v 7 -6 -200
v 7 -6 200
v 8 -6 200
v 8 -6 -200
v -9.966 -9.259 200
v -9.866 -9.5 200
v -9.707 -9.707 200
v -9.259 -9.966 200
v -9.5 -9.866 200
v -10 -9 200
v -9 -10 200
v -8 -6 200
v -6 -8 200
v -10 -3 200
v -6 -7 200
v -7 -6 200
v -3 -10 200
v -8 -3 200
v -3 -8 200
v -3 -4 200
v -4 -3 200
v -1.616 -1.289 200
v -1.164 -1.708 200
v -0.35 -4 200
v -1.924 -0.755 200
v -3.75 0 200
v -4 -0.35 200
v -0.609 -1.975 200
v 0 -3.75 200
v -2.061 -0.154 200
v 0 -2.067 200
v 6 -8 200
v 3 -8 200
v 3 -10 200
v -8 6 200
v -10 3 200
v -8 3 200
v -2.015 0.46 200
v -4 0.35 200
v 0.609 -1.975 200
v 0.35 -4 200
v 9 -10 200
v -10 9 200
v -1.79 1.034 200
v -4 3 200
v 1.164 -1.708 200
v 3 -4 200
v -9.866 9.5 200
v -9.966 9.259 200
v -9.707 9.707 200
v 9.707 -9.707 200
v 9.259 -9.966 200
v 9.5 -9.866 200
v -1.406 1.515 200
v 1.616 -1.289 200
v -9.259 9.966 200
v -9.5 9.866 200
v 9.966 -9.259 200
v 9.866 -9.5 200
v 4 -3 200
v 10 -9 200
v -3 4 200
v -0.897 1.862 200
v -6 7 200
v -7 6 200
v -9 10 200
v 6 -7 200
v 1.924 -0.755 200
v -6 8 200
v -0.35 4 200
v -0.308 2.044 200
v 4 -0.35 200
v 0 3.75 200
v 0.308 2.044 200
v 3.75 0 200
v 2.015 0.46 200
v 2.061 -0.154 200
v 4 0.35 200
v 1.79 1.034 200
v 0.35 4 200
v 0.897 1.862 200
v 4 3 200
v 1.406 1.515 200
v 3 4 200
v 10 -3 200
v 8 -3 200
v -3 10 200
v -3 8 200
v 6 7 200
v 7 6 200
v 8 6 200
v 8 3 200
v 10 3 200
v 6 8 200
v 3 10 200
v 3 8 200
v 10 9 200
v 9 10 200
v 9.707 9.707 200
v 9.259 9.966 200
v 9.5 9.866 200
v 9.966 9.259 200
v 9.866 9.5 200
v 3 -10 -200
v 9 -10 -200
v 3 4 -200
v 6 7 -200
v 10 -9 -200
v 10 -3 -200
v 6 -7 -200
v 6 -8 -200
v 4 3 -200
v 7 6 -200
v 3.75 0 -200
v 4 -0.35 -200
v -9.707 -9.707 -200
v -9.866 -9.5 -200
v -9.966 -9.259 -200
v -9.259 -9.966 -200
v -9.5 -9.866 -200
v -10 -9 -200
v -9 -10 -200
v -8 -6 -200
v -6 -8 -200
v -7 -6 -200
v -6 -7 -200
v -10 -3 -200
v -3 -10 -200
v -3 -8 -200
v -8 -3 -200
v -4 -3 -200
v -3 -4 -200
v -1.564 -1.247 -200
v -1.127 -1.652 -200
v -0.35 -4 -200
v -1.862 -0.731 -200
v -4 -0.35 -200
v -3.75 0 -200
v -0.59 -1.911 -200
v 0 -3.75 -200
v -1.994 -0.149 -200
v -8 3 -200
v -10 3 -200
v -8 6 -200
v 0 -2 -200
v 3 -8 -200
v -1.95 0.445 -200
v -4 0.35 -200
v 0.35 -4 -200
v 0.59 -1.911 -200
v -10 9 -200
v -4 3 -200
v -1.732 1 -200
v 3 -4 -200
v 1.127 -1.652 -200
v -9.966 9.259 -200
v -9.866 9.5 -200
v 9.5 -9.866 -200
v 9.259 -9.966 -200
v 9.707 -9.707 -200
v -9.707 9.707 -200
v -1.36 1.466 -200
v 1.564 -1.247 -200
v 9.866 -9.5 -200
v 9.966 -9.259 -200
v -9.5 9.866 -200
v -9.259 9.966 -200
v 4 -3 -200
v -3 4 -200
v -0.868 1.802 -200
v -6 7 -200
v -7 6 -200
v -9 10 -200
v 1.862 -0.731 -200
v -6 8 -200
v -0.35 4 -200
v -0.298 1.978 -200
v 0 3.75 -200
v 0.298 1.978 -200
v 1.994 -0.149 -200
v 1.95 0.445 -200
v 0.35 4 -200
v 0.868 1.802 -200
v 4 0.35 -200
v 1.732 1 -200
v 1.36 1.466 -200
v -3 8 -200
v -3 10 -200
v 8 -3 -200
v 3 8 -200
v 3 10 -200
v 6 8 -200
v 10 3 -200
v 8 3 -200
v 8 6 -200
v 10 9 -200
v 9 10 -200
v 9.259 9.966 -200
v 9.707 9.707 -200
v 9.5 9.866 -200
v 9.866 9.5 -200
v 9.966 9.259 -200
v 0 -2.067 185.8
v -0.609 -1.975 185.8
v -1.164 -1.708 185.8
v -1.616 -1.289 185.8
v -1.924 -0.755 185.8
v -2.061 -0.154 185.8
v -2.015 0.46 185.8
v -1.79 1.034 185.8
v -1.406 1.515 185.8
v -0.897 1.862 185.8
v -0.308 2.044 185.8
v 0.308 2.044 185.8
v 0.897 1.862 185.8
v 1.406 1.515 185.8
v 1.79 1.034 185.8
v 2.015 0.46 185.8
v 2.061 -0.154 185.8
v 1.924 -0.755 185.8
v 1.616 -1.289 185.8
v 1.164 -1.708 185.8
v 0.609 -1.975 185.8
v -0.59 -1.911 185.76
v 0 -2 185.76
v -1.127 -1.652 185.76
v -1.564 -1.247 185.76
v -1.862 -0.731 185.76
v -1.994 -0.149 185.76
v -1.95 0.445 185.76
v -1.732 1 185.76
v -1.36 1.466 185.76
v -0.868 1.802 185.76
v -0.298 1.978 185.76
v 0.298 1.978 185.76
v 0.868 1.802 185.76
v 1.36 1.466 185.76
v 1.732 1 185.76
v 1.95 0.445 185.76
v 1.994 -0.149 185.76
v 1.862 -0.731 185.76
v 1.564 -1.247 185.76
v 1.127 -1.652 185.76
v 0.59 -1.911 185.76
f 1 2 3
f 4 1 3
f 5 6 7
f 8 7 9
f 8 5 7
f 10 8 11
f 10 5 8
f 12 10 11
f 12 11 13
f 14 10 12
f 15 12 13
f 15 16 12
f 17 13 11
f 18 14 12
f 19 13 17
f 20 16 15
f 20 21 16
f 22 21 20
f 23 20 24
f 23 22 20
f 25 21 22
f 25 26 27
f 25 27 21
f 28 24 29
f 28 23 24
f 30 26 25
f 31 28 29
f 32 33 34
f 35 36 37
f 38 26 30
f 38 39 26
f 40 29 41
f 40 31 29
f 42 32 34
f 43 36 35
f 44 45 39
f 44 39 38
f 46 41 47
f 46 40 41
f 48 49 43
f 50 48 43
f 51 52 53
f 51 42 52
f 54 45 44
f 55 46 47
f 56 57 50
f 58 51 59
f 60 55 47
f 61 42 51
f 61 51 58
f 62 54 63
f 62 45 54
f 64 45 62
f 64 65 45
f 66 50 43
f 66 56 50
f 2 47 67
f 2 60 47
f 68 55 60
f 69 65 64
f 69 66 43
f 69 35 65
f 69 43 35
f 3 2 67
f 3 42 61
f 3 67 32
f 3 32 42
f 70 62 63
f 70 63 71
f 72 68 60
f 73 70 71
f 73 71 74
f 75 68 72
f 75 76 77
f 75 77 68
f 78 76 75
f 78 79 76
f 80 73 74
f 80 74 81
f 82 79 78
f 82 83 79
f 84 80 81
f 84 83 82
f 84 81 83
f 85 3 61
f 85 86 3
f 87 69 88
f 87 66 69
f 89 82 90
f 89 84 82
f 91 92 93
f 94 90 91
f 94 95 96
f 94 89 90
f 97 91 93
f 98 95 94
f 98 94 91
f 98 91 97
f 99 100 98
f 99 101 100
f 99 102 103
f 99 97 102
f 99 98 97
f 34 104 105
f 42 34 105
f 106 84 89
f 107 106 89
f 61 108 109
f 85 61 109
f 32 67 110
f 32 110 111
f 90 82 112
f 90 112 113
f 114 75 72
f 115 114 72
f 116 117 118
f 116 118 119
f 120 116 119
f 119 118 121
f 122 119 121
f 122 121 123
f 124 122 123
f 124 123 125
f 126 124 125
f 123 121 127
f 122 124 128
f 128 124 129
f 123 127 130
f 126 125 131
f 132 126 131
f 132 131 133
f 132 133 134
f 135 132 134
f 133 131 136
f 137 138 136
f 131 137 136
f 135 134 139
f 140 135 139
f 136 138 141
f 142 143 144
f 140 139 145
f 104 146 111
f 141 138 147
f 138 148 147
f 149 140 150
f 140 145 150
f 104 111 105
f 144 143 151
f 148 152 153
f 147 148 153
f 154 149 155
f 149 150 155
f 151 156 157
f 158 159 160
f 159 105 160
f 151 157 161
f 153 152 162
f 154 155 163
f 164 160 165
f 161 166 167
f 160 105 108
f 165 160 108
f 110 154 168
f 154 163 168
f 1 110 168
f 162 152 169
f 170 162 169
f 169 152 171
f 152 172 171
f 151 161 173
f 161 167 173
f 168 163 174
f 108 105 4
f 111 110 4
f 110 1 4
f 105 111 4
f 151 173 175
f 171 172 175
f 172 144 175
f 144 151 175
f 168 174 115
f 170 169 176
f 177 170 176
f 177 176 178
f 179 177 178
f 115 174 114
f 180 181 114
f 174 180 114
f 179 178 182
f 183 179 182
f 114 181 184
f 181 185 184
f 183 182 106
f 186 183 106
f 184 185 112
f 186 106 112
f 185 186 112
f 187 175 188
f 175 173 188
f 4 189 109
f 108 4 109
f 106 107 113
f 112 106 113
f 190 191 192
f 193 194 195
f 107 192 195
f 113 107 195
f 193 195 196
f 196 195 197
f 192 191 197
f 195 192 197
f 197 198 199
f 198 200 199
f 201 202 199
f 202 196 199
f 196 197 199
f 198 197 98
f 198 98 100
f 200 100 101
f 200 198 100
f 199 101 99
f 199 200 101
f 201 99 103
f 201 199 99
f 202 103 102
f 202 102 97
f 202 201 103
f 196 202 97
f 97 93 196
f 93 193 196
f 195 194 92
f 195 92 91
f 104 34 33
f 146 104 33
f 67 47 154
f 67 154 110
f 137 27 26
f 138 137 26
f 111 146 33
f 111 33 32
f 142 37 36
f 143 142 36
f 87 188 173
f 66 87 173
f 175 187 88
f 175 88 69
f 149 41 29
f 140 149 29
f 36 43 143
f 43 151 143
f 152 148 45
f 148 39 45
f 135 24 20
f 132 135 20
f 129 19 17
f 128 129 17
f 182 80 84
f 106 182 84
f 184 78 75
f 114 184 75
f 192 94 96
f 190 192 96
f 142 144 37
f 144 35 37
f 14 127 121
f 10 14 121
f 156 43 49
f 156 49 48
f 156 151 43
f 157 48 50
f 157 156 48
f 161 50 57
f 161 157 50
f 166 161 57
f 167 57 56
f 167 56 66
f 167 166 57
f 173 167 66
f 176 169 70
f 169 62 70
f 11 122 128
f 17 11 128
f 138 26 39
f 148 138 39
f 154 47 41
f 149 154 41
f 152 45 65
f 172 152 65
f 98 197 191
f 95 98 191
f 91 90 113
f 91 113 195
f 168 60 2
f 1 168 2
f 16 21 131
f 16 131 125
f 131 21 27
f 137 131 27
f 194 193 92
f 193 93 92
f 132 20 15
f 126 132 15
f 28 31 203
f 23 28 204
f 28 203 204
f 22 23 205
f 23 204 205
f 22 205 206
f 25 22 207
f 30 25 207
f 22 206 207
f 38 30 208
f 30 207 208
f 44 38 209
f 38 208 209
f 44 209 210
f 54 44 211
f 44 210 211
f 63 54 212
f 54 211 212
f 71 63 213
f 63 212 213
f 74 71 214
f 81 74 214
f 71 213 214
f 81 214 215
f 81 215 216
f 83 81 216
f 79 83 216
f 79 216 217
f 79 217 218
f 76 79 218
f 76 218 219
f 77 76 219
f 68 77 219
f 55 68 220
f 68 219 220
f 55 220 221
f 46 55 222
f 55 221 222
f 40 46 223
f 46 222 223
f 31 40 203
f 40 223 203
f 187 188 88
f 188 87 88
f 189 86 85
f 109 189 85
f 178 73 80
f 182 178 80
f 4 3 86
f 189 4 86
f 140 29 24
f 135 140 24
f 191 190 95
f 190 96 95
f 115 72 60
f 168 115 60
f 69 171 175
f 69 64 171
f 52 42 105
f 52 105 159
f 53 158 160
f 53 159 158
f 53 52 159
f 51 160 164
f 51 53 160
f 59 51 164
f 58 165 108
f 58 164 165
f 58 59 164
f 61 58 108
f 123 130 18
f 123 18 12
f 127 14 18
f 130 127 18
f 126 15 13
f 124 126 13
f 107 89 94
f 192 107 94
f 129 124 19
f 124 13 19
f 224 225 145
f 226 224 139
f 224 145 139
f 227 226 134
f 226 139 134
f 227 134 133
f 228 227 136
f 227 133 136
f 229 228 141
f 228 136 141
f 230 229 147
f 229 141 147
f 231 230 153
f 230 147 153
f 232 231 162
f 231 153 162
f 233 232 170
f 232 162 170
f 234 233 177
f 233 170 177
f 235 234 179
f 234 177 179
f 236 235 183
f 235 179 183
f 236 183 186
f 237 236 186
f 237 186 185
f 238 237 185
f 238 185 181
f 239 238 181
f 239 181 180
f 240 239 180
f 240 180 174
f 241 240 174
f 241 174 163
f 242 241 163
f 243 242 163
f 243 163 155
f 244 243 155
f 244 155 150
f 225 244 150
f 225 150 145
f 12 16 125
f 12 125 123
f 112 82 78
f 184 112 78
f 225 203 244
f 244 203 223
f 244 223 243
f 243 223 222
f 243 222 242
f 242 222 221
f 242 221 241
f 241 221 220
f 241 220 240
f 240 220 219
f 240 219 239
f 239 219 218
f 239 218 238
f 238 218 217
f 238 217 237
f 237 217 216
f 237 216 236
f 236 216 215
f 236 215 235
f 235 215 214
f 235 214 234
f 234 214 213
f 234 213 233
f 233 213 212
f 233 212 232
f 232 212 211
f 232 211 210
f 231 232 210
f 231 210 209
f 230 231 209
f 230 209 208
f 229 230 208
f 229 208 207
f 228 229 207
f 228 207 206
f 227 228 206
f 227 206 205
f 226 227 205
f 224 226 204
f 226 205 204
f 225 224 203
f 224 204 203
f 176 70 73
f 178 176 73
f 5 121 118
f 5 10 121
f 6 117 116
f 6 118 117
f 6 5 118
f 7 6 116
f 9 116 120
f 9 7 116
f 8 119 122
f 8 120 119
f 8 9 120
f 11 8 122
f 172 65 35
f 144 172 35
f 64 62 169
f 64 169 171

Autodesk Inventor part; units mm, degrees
ref_plane "YZ Plane" through (0, 0, 0) normal (1, 0, 0) x (0, 1, 0)
ref_plane "XZ Plane" through (0, 0, 0) normal (0, 1, 0) x (-1, 0, 0)
ref_plane "XY Plane" through (0, 0, 0) normal (0, 0, 1) x (1, 0, 0)
sketch "Sketch1" plane through (0, 0, 0) normal (0, 0, 1) x (1, 0, 0)
  line L0 (-10, -10) -> (10, -10)
  line L1 (10, -10) -> (10, 10)
  line L2 (10, 10) -> (-10, 10)
  line L3 (-10, 10) -> (-10, -10)
  line L4 (-10, -10) -> (10, 10) construction
  line L5 (10, -10) -> (-10, 10) construction
  point P0 (0, 0)
  dimension "d0" = 20
  dimension "d1" = 20
extrude "Extrusion1" add sketch "Sketch1" along normal mid plane 400
sketch "Sketch2" plane through (0, 0, 200) normal (0, 0, 1) x (1, 0, 0)
  line L0 (-10, -10) -> (10, -10) projected
  line L1 (10, -10) -> (10, 10) projected
  line L2 (10, 10) -> (-10, 10) projected
  line L3 (-10, 10) -> (-10, -10) projected
  line L4 (10, 10) -> (-10, 10) projected
  line L5 (-3, 10) -> (-3, 8)
  line L6 (-3, 8) -> (-6, 8)
  line L7 (-3, 4) -> (3, 4)
  line L8 (6, 8) -> (3, 8)
  line L9 (3, 8) -> (3, 10)
  line L10 (-3, 4) -> (-6, 7)
  line L11 (-6, 7) -> (-6, 8)
  line L12 (3, 4) -> (6, 7)
  line L13 (6, 7) -> (6, 8)
  line L14 (-0.35, 4) -> (0, 3.75)
  line L15 (0, 3.75) -> (0.35, 4)
  point P0 (0, 0)
  point P1 (0, 4)
  dimension "d5" = 2
  dimension "d6" = 4
  dimension "d7" = 12
  dimension "d8" = 6
  dimension "d9" = 1
  dimension "d10" = 6
  dimension "d11" = 6
  dimension "d25" = 0.25
  dimension "d26" = 0.7
extrude "Extrusion2" cut sketch "Sketch2" against normal through all contours L2 L9 L8 L13 L12 L7 L10 L11 L6 L5 | L7 L15 L14
pattern_circular "Circular Pattern1" count 4 over 360 about axis through (0, 0, -10) along (0, 0, 1) of "Extrusion2"
fillet "Fillet1" radius 1 4 edges at (10, 10, 0) (10, -10, 0) (-10, 10, 0) (-10, -10, 0)
sketch "Sketch3" plane through (0, 0, 200) normal (0, 0, 1) x (1, 0, 0)
  point P0 (0, 0)
  point P1 (-0.1169, 0.6773)
hole "Hole1" at (0, 0, 200) direction (0, 0, -1) diameter 4 end through all
sketch "Sketch5" plane through (0, 0, 200) normal (0, 0, 1) x (1, 0, 0)
  circle A0 centre (0, 0) radius 2 projected
hole "Hole2" at (0, 0, 200) direction (0, 0, -1) diameter 4.134 depth 14.2 tip angle 118 thread size "M5x0.8" class "6H" standard "ANSI Metric M Profile"
properties part number "20x20 Extrusion with threaded end" material "Aluminum 6061"
